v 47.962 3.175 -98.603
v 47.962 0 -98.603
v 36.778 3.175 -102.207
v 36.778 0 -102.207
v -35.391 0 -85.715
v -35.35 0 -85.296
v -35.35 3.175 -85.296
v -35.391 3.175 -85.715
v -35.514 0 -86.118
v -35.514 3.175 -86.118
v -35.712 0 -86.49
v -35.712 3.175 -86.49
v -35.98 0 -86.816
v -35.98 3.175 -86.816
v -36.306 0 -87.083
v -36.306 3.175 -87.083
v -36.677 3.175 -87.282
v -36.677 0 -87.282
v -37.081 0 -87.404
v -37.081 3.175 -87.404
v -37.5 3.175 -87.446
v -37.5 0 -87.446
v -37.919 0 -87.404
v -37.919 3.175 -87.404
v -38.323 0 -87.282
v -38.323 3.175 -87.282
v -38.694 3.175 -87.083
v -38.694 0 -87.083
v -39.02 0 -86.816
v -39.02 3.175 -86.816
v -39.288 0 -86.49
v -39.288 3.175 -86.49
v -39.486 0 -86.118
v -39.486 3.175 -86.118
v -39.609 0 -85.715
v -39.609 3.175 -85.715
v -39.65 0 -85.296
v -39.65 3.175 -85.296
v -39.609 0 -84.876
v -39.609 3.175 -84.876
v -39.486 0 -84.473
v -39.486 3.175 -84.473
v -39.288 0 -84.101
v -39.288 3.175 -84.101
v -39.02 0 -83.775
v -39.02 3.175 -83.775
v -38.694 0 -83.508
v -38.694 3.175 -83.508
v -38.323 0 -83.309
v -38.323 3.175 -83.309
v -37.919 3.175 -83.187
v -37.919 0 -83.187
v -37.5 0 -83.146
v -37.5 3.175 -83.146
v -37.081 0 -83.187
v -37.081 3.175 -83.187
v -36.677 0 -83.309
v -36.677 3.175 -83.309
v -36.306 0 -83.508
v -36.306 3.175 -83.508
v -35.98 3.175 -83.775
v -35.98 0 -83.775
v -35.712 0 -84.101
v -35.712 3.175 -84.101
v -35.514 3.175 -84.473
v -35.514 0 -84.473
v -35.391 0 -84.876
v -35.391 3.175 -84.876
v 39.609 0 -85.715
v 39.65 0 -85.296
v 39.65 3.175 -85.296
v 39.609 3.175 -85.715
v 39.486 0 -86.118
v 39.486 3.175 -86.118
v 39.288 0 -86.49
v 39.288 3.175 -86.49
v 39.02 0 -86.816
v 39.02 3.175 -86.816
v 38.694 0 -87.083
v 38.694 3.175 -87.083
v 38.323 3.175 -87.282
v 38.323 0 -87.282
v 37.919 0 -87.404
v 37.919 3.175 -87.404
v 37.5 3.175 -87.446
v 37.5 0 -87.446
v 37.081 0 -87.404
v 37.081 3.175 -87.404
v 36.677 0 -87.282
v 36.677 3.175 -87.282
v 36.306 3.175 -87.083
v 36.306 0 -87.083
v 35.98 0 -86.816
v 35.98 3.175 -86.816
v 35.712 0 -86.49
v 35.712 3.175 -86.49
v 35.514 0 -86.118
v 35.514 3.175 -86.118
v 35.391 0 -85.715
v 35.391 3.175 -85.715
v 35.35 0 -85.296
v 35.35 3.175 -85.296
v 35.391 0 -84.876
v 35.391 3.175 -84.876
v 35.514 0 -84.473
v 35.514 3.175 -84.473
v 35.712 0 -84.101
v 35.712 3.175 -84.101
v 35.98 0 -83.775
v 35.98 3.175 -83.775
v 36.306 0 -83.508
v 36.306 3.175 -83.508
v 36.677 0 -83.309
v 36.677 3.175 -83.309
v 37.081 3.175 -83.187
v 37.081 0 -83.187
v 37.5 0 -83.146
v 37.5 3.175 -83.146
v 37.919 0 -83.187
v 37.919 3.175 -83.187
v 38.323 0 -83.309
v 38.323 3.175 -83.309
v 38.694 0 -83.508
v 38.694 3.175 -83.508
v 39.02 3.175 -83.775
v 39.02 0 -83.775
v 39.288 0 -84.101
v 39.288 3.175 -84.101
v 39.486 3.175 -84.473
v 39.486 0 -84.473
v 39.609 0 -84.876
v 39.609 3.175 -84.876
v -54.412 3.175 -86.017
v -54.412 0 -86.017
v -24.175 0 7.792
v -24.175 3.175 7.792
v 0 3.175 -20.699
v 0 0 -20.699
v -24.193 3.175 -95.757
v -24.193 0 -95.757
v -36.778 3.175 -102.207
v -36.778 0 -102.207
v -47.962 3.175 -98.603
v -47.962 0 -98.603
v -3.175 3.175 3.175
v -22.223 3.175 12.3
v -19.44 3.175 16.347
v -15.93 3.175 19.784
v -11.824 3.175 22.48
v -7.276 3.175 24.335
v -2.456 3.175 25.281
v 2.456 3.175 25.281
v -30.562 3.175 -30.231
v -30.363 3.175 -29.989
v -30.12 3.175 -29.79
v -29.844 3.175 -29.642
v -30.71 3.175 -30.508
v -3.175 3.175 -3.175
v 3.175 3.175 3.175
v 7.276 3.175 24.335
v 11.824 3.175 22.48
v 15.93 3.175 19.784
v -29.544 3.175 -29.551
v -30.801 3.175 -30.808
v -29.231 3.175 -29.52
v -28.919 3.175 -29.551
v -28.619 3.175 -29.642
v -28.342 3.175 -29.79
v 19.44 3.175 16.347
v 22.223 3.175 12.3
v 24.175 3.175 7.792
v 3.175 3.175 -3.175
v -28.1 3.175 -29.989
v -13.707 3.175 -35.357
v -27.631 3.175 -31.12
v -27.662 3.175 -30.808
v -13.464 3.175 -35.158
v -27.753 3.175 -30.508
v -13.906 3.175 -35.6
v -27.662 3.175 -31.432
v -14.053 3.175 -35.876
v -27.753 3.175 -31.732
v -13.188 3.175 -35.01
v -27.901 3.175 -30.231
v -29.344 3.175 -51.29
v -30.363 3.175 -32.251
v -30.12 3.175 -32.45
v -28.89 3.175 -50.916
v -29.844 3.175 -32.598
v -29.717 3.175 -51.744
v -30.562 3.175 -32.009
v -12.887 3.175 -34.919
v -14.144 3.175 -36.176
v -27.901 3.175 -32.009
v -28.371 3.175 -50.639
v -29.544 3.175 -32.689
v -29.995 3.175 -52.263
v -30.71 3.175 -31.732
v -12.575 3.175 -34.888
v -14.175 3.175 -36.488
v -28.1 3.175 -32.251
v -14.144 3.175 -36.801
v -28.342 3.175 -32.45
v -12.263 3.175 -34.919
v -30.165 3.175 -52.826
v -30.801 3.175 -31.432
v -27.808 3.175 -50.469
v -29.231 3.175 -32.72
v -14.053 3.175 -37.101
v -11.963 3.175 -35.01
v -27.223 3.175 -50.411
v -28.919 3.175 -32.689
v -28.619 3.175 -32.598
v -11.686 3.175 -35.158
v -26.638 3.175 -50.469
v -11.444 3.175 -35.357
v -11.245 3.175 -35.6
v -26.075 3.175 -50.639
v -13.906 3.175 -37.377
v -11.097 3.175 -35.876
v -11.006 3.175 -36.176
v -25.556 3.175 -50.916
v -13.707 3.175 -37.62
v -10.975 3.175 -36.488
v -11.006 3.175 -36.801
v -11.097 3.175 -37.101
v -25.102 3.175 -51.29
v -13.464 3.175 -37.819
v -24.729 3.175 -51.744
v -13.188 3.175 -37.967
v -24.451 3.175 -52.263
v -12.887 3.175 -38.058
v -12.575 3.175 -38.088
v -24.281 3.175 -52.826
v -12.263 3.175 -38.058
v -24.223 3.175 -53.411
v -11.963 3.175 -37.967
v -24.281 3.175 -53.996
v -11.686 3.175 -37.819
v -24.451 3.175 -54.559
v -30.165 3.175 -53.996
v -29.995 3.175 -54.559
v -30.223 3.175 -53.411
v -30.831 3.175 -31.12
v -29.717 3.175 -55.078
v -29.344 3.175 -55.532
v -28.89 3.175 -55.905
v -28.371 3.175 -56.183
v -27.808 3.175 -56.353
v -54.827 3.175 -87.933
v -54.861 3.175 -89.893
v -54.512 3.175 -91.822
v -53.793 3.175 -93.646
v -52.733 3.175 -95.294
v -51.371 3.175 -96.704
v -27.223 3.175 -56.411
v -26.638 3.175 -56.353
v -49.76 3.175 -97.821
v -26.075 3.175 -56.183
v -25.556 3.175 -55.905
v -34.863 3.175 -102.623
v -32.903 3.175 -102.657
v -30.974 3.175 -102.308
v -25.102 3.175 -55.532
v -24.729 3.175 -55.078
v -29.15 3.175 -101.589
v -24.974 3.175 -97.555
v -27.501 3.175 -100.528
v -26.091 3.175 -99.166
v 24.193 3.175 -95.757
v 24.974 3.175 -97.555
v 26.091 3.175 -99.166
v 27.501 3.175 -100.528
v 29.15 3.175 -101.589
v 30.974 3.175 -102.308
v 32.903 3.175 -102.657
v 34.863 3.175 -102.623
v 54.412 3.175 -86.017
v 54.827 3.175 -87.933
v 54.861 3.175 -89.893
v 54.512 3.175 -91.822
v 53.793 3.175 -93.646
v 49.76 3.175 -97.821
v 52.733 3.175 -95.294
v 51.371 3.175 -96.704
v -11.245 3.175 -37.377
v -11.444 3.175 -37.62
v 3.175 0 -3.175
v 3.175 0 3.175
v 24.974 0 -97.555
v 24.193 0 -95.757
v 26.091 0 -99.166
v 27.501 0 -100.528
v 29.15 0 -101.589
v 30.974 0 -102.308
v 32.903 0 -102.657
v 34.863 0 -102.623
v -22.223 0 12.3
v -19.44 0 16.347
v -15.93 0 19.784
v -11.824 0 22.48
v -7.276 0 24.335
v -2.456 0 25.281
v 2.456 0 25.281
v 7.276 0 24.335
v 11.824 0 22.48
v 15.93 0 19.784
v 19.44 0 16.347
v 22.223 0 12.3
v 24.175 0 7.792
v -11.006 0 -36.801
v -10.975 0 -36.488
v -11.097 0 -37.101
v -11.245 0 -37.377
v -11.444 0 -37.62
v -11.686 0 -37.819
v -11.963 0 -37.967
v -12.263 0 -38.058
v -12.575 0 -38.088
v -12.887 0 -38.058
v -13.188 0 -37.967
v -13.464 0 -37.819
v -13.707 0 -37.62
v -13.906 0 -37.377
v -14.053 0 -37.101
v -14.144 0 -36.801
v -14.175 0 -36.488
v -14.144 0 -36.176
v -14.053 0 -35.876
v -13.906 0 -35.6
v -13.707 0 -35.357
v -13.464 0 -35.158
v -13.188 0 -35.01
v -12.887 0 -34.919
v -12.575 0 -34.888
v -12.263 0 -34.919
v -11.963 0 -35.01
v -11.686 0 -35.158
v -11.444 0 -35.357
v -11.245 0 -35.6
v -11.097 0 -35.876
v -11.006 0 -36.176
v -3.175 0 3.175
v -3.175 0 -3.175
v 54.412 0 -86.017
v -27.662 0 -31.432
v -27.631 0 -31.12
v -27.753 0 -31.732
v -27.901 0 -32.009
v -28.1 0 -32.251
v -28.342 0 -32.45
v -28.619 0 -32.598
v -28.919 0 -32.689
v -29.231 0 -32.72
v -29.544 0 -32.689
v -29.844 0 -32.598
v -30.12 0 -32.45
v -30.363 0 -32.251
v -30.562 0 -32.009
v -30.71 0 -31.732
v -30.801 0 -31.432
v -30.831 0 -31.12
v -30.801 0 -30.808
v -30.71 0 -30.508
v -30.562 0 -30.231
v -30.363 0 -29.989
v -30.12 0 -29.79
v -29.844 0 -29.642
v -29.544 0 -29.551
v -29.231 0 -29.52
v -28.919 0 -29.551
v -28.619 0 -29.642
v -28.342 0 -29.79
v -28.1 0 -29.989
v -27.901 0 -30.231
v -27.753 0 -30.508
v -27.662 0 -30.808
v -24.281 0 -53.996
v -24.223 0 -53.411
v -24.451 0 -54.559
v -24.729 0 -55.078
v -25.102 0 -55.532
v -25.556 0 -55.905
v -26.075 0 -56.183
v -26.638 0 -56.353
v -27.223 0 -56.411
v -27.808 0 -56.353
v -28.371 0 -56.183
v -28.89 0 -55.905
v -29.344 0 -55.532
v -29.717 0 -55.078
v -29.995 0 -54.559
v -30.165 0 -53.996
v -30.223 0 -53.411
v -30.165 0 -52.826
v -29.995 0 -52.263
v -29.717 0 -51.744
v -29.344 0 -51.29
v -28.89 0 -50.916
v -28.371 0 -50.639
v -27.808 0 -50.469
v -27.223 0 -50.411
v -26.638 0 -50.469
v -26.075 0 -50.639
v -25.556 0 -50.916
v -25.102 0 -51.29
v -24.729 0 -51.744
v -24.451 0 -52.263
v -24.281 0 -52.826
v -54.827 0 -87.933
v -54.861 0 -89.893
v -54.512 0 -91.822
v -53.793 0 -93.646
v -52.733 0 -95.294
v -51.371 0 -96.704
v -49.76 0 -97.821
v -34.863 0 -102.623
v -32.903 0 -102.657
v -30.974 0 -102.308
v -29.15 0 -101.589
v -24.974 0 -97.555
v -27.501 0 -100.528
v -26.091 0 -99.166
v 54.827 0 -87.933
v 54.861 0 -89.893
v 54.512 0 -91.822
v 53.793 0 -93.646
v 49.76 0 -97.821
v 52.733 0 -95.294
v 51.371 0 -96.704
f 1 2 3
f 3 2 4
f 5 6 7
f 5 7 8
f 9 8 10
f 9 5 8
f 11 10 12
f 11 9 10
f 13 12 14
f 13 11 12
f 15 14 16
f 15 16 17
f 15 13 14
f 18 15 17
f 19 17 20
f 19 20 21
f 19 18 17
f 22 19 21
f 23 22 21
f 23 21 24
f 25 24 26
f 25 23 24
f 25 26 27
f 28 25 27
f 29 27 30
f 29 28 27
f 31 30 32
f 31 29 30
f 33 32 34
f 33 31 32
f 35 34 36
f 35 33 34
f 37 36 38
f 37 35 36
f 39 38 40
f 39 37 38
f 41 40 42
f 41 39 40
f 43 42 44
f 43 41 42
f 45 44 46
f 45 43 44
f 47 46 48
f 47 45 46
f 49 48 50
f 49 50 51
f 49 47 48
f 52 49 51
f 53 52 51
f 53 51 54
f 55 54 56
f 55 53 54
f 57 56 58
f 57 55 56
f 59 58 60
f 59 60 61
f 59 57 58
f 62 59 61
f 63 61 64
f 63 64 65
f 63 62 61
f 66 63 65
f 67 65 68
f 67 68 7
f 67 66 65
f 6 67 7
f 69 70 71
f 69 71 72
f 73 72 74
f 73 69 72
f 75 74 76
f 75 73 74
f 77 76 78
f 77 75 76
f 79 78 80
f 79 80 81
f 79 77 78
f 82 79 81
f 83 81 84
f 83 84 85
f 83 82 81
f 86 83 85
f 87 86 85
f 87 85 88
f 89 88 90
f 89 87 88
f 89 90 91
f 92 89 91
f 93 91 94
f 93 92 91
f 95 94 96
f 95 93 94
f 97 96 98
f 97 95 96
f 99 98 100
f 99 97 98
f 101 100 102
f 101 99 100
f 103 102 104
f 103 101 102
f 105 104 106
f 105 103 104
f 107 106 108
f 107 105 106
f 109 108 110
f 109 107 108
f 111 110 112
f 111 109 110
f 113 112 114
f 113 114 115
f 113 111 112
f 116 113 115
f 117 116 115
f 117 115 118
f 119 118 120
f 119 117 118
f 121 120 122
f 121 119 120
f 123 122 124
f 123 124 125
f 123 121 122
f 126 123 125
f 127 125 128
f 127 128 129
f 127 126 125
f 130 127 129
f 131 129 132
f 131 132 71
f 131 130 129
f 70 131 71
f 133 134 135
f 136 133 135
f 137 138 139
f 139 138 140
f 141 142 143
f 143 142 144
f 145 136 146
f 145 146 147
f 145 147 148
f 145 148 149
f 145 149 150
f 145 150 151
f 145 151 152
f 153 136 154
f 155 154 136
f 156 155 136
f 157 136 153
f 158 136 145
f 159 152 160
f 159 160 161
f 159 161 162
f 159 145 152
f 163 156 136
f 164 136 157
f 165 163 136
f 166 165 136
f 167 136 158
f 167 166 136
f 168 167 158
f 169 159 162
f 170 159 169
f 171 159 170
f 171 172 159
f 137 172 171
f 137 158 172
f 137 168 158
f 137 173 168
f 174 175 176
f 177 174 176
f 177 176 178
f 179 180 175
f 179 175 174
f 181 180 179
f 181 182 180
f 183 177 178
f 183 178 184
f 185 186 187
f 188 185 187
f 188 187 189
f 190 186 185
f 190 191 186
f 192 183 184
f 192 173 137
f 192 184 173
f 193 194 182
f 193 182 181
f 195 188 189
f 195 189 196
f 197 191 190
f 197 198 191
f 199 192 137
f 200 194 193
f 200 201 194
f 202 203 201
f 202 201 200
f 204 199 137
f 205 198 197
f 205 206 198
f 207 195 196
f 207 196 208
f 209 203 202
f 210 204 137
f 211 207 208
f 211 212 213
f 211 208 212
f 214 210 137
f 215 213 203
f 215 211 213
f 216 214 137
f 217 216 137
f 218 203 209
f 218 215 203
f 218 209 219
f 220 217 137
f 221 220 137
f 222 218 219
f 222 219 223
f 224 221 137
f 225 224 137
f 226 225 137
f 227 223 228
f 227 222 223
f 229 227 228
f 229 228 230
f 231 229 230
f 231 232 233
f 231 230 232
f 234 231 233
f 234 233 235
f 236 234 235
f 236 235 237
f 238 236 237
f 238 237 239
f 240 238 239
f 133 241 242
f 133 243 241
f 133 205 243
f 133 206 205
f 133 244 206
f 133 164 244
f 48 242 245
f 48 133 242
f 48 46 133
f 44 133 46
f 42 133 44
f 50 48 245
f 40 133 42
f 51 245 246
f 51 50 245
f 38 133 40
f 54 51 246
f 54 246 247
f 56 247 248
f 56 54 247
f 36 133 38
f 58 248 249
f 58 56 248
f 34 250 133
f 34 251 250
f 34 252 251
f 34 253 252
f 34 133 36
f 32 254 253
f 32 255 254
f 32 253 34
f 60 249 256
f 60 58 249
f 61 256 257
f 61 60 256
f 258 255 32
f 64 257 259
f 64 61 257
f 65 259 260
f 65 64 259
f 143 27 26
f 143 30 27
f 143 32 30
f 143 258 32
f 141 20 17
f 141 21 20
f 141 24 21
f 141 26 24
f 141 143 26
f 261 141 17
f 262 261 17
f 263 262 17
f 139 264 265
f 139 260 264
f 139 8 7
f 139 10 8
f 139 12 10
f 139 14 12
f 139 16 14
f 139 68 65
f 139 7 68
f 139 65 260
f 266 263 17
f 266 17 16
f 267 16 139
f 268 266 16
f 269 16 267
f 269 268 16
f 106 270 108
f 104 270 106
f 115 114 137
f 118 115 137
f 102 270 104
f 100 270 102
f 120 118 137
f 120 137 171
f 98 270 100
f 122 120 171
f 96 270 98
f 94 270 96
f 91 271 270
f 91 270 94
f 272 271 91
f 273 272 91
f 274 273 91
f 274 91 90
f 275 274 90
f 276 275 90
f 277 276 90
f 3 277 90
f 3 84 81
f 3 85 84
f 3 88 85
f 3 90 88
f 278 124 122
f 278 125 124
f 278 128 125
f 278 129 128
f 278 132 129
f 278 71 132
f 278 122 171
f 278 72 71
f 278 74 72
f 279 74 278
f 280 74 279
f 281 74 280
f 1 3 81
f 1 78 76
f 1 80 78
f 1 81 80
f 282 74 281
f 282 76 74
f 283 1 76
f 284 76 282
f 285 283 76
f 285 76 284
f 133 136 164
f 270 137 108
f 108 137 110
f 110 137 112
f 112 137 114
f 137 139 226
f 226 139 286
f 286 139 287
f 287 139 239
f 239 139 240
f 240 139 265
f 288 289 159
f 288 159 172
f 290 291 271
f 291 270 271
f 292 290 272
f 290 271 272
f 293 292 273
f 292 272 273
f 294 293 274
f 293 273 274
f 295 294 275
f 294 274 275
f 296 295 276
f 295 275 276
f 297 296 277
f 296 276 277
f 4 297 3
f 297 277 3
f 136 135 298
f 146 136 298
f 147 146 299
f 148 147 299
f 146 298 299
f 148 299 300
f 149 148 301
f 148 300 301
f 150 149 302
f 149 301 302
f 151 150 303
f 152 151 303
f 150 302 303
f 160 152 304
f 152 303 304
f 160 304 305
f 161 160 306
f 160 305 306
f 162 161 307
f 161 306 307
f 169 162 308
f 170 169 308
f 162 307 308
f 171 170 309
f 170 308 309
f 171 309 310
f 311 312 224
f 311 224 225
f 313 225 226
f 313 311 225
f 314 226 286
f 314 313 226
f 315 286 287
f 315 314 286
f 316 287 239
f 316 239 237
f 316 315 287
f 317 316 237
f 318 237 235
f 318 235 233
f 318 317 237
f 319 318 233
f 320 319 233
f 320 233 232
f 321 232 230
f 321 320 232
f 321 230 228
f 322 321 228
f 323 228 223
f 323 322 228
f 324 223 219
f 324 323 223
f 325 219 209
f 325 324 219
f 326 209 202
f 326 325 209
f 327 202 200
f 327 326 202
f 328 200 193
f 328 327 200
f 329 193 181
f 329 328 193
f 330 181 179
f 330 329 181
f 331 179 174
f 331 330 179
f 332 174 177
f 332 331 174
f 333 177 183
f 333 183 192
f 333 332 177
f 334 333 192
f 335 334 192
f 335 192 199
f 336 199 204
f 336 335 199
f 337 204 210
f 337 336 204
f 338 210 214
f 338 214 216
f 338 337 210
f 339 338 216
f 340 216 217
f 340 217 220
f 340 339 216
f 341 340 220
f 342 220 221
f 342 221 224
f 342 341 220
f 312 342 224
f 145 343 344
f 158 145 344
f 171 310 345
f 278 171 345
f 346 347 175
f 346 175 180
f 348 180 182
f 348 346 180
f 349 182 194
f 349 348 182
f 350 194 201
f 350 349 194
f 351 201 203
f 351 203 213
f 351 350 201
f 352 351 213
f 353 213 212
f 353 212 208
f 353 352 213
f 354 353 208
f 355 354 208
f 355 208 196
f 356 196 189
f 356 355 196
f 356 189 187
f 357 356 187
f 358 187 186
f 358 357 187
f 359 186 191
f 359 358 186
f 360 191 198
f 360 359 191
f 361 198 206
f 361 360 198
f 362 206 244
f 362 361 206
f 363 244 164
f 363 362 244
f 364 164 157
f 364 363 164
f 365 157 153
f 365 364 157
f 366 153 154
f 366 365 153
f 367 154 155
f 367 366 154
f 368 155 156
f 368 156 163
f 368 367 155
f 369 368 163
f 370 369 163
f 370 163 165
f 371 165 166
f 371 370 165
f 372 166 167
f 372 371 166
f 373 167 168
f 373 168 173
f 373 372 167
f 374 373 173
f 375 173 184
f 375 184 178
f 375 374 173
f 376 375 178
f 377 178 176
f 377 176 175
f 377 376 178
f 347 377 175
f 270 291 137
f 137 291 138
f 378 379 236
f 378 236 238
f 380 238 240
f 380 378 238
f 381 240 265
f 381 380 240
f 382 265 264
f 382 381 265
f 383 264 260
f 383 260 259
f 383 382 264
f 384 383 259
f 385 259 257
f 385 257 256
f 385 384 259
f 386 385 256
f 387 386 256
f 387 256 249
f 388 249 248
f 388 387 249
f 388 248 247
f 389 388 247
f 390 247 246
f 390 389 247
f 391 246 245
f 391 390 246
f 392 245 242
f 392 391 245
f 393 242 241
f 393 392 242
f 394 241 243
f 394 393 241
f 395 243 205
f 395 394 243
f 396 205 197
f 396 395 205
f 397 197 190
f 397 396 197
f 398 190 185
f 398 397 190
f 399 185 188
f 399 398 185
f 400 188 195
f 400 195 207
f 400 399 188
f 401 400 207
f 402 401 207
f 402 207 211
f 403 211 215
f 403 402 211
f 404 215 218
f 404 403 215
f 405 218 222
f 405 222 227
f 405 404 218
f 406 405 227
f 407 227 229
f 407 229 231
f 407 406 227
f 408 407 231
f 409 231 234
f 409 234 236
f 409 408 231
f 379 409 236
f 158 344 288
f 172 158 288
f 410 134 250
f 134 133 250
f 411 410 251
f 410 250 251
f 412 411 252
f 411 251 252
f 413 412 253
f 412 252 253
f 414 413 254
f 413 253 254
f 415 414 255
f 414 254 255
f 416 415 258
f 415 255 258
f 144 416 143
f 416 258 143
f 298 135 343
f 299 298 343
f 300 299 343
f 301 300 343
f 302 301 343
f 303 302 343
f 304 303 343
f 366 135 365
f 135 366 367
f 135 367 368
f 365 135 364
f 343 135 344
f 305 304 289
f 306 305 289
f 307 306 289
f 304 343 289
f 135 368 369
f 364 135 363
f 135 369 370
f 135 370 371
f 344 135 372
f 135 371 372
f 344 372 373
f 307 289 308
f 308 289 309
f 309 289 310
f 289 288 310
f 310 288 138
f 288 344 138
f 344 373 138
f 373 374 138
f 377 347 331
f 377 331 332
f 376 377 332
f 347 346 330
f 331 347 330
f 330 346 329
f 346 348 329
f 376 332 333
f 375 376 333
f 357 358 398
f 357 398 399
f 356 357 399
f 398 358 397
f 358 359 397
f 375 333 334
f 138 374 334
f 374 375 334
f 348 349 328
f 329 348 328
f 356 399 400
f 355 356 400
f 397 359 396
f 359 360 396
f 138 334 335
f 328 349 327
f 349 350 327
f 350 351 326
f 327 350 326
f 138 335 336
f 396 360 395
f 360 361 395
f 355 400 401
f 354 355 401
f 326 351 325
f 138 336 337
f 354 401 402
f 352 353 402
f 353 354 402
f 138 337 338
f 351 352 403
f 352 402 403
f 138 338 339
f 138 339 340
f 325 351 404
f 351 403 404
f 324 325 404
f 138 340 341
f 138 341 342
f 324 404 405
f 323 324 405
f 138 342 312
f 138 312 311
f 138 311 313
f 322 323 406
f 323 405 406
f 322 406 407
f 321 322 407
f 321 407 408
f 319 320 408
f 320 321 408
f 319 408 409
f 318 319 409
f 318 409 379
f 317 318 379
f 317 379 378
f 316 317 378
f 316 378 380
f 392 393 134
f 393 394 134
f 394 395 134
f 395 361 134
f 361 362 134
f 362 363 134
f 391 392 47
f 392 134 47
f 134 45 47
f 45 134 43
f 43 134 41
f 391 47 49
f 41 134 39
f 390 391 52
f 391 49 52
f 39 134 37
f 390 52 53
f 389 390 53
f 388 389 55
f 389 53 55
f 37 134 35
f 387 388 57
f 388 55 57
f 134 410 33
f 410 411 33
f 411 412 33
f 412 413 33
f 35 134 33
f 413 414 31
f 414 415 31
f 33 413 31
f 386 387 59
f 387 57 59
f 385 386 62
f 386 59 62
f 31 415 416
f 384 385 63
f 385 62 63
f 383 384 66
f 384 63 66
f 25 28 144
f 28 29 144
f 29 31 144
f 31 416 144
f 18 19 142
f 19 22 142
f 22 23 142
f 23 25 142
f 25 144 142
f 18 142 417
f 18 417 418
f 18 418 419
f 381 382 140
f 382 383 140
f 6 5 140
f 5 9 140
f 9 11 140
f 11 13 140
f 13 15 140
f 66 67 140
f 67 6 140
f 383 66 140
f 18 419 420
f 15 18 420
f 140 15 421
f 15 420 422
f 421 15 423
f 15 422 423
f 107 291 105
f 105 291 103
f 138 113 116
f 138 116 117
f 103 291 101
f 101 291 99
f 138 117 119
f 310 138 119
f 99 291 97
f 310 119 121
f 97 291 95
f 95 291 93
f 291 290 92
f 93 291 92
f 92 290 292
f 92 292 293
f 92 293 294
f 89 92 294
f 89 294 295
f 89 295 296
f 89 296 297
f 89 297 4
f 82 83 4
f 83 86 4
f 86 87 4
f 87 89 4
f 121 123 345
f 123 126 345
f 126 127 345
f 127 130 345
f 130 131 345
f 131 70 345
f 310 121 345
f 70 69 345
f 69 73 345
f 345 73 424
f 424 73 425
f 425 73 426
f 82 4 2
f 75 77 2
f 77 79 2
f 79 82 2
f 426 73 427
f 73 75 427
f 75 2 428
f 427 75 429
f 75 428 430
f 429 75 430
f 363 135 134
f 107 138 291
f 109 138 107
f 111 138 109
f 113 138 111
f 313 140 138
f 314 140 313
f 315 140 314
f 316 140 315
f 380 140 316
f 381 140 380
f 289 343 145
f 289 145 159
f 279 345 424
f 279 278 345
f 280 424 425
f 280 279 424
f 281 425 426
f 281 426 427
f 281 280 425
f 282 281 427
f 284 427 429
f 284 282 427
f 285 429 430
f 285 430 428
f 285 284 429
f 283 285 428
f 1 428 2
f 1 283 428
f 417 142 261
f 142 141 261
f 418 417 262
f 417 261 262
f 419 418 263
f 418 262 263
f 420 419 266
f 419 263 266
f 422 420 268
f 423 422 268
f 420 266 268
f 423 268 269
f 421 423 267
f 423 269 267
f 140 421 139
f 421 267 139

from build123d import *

# Parameters (mm, degrees)
SKETCH1_R           = 2.15
SKETCH1_R_2         = 3
SKETCH1_R_3         = 1.6
SKETCH1_W           = 6.35
SKETCH1_H           = 6.35
BOSS_EXTRUDE1_DEPTH = 3.175
FILLET1_R           = 10


with BuildPart() as part:
    # Sketch1 → Boss-Extrude1 (new body)
    with BuildSketch(Plane(origin=(0, 0, 0), x_dir=(1, 0, 0), z_dir=(0, 1, 0))):
        with BuildLine():
            Line((-57.479624947, 95.534974299), (-24.175240451, -7.792159464))
            ThreePointArc((-24.175240451, -7.792159464), (0, -25.4), (24.175240451, -7.792159464))
            Line((24.175240451, -7.792159464), (57.479624947, 95.534974299))
            Line((57.479624947, 95.534974299), (27.260574383, 105.27517363))
            Line((27.260574383, 105.27517363), (0, 20.69901171))
            Line((0, 20.69901171), (-27.260574383, 105.27517363))
            Line((-27.260574383, 105.27517363), (-57.479624947, 95.534974299))
        make_face()
        with Locations((37.5, 85.295548682)):
            Circle(SKETCH1_R, mode=Mode.SUBTRACT)
        with Locations((-37.5, 85.295548682)):
            Circle(SKETCH1_R, mode=Mode.SUBTRACT)
        with Locations((-27.222939289, 53.410881158)):
            Circle(SKETCH1_R_2, mode=Mode.SUBTRACT)
        with Locations((-29.231398698, 31.119883181)):
            Circle(SKETCH1_R_3, mode=Mode.SUBTRACT)
        with Locations((-12.575229096, 36.488496985)):
            Circle(SKETCH1_R_3, mode=Mode.SUBTRACT)
        Rectangle(SKETCH1_W, SKETCH1_H, mode=Mode.SUBTRACT)
    extrude(amount=BOSS_EXTRUDE1_DEPTH)

    # Fillet1
    fillet1_edges = [part.edges().sort_by_distance(p)[0] for p in [
        (-27.260574383, 1.5875, -105.27517363),
        (27.260574383, 1.5875, -105.27517363),
        (57.479624947, 1.5875, -95.534974299),
        (-57.479624947, 1.5875, -95.534974299),
    ]]
    fillet(fillet1_edges, radius=FILLET1_R)


solid = part.part
